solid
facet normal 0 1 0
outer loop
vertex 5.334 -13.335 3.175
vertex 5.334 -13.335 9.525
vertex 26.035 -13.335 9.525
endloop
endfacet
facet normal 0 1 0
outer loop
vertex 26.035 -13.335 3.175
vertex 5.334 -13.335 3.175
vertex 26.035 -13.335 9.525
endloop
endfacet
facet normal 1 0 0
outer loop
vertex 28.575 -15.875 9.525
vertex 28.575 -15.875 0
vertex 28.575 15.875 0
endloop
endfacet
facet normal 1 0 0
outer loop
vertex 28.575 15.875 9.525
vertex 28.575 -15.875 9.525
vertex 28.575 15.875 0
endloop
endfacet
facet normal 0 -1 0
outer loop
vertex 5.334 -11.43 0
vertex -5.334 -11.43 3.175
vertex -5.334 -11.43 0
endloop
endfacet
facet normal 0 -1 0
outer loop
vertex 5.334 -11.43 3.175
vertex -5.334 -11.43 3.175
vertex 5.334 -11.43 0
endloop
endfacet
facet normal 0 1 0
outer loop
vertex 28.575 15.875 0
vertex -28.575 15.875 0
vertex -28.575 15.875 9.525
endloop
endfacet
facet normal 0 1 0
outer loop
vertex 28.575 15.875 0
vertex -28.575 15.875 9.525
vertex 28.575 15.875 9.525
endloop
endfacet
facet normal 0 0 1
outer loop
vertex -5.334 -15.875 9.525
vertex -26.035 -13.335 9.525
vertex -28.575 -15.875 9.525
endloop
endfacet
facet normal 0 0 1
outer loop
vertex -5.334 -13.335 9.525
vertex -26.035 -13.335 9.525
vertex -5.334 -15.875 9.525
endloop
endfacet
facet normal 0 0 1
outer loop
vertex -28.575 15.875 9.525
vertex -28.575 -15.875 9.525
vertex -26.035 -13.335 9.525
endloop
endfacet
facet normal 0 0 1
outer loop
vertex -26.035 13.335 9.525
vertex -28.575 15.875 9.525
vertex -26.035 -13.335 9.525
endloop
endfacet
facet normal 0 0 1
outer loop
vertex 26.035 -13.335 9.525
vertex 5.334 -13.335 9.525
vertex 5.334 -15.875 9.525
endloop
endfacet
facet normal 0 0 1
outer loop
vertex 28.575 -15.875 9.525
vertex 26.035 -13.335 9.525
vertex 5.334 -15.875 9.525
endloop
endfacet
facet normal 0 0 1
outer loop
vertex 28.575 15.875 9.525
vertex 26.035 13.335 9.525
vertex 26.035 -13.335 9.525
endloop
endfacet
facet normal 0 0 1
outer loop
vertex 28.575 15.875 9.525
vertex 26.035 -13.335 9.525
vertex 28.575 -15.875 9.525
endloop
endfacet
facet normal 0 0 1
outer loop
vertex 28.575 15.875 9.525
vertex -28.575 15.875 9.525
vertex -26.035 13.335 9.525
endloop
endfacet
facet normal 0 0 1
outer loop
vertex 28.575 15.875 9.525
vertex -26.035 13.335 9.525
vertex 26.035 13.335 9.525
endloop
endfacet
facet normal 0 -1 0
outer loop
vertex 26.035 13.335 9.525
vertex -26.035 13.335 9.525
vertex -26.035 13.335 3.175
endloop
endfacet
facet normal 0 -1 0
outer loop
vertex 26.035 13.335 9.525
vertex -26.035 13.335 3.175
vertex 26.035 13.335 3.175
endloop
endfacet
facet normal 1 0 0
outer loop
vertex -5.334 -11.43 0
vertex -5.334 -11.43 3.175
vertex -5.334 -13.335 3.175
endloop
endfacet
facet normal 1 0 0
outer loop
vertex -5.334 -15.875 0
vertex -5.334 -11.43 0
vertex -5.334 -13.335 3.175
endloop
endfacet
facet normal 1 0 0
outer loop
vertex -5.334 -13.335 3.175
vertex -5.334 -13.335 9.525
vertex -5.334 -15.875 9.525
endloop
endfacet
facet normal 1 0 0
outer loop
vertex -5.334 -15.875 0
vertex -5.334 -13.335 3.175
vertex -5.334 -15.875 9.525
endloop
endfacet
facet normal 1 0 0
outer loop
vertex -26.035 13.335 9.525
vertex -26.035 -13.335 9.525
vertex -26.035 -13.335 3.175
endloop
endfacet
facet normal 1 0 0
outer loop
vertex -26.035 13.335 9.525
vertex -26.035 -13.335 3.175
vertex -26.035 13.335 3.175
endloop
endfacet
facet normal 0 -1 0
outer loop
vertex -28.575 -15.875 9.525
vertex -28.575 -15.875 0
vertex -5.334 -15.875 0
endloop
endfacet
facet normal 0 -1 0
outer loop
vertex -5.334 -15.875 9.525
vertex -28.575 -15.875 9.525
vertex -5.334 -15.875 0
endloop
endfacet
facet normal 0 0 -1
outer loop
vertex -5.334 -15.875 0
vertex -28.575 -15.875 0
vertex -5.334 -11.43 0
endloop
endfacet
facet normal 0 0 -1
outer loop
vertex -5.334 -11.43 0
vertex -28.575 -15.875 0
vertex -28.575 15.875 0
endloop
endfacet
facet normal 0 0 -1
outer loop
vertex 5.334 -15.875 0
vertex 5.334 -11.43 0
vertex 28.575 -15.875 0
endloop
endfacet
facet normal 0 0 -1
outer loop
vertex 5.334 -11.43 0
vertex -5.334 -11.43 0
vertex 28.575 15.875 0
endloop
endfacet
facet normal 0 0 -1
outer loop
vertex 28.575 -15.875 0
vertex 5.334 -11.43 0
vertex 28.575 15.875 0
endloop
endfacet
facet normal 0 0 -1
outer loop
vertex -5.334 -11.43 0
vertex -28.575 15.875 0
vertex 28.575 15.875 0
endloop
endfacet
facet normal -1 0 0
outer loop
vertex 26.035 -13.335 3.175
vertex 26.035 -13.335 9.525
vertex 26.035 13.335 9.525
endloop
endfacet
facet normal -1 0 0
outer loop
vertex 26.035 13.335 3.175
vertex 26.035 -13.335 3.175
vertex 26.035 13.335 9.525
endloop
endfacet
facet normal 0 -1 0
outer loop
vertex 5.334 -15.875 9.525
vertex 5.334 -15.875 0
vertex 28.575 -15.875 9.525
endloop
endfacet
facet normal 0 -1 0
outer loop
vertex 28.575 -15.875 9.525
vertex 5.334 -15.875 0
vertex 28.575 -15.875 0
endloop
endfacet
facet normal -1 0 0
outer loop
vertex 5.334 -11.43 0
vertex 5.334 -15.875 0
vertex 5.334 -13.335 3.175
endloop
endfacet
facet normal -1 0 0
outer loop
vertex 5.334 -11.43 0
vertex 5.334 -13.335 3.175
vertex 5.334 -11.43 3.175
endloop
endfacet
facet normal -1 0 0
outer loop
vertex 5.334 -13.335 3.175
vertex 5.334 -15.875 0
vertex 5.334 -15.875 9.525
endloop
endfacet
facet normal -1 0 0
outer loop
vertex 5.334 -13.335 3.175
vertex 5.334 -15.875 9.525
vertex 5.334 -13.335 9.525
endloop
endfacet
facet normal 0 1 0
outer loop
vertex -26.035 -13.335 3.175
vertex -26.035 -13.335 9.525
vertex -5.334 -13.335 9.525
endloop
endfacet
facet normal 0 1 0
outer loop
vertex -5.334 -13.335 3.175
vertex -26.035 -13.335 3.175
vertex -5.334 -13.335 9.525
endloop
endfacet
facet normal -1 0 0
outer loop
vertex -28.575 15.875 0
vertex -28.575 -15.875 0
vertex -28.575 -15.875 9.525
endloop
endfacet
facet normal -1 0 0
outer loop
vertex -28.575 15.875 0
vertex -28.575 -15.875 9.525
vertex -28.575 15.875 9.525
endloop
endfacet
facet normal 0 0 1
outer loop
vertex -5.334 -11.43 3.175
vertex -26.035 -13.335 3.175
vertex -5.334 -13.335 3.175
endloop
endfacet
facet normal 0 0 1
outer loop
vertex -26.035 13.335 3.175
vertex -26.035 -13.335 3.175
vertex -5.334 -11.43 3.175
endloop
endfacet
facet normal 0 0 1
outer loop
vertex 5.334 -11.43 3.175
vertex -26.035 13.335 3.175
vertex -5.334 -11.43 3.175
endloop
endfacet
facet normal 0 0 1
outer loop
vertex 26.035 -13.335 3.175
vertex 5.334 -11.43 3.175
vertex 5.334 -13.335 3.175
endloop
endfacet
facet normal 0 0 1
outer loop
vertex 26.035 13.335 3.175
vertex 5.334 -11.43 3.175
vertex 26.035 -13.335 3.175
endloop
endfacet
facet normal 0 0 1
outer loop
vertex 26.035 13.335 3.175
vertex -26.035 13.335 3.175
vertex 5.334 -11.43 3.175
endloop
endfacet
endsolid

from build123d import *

# Parameters (mm, degrees)
F0_W     = 57.15
F0_H     = 31.75
F1_DEPTH = 9.525
F2_W     = 52.07
F2_H     = 26.67
F3_DEPTH = 6.35
F4_W     = 10.668
F4_H     = 2.54
F4_H_2   = 1.905
F5_DEPTH = 25.4


with BuildPart() as f1:
    # F0 (on Top) → F1 (new body)
    with BuildSketch(Plane.XY):
        Rectangle(F0_W, F0_H)
    extrude(amount=F1_DEPTH)

    # F2 (on face) → F3 (cut)
    with BuildSketch(Plane.XY.offset(9.525)):
        Rectangle(F2_W, F2_H)
    extrude(amount=-F3_DEPTH, mode=Mode.SUBTRACT)

    # F4 (on face) → F5 (cut)
    with BuildSketch(Plane.XY.offset(9.525)):
        with Locations((0, -14.605)):
            Rectangle(F4_W, F4_H)
        with Locations((0, -12.3825)):
            Rectangle(F4_W, F4_H_2)
    extrude(amount=-F5_DEPTH, mode=Mode.SUBTRACT)


solid = f1.part
